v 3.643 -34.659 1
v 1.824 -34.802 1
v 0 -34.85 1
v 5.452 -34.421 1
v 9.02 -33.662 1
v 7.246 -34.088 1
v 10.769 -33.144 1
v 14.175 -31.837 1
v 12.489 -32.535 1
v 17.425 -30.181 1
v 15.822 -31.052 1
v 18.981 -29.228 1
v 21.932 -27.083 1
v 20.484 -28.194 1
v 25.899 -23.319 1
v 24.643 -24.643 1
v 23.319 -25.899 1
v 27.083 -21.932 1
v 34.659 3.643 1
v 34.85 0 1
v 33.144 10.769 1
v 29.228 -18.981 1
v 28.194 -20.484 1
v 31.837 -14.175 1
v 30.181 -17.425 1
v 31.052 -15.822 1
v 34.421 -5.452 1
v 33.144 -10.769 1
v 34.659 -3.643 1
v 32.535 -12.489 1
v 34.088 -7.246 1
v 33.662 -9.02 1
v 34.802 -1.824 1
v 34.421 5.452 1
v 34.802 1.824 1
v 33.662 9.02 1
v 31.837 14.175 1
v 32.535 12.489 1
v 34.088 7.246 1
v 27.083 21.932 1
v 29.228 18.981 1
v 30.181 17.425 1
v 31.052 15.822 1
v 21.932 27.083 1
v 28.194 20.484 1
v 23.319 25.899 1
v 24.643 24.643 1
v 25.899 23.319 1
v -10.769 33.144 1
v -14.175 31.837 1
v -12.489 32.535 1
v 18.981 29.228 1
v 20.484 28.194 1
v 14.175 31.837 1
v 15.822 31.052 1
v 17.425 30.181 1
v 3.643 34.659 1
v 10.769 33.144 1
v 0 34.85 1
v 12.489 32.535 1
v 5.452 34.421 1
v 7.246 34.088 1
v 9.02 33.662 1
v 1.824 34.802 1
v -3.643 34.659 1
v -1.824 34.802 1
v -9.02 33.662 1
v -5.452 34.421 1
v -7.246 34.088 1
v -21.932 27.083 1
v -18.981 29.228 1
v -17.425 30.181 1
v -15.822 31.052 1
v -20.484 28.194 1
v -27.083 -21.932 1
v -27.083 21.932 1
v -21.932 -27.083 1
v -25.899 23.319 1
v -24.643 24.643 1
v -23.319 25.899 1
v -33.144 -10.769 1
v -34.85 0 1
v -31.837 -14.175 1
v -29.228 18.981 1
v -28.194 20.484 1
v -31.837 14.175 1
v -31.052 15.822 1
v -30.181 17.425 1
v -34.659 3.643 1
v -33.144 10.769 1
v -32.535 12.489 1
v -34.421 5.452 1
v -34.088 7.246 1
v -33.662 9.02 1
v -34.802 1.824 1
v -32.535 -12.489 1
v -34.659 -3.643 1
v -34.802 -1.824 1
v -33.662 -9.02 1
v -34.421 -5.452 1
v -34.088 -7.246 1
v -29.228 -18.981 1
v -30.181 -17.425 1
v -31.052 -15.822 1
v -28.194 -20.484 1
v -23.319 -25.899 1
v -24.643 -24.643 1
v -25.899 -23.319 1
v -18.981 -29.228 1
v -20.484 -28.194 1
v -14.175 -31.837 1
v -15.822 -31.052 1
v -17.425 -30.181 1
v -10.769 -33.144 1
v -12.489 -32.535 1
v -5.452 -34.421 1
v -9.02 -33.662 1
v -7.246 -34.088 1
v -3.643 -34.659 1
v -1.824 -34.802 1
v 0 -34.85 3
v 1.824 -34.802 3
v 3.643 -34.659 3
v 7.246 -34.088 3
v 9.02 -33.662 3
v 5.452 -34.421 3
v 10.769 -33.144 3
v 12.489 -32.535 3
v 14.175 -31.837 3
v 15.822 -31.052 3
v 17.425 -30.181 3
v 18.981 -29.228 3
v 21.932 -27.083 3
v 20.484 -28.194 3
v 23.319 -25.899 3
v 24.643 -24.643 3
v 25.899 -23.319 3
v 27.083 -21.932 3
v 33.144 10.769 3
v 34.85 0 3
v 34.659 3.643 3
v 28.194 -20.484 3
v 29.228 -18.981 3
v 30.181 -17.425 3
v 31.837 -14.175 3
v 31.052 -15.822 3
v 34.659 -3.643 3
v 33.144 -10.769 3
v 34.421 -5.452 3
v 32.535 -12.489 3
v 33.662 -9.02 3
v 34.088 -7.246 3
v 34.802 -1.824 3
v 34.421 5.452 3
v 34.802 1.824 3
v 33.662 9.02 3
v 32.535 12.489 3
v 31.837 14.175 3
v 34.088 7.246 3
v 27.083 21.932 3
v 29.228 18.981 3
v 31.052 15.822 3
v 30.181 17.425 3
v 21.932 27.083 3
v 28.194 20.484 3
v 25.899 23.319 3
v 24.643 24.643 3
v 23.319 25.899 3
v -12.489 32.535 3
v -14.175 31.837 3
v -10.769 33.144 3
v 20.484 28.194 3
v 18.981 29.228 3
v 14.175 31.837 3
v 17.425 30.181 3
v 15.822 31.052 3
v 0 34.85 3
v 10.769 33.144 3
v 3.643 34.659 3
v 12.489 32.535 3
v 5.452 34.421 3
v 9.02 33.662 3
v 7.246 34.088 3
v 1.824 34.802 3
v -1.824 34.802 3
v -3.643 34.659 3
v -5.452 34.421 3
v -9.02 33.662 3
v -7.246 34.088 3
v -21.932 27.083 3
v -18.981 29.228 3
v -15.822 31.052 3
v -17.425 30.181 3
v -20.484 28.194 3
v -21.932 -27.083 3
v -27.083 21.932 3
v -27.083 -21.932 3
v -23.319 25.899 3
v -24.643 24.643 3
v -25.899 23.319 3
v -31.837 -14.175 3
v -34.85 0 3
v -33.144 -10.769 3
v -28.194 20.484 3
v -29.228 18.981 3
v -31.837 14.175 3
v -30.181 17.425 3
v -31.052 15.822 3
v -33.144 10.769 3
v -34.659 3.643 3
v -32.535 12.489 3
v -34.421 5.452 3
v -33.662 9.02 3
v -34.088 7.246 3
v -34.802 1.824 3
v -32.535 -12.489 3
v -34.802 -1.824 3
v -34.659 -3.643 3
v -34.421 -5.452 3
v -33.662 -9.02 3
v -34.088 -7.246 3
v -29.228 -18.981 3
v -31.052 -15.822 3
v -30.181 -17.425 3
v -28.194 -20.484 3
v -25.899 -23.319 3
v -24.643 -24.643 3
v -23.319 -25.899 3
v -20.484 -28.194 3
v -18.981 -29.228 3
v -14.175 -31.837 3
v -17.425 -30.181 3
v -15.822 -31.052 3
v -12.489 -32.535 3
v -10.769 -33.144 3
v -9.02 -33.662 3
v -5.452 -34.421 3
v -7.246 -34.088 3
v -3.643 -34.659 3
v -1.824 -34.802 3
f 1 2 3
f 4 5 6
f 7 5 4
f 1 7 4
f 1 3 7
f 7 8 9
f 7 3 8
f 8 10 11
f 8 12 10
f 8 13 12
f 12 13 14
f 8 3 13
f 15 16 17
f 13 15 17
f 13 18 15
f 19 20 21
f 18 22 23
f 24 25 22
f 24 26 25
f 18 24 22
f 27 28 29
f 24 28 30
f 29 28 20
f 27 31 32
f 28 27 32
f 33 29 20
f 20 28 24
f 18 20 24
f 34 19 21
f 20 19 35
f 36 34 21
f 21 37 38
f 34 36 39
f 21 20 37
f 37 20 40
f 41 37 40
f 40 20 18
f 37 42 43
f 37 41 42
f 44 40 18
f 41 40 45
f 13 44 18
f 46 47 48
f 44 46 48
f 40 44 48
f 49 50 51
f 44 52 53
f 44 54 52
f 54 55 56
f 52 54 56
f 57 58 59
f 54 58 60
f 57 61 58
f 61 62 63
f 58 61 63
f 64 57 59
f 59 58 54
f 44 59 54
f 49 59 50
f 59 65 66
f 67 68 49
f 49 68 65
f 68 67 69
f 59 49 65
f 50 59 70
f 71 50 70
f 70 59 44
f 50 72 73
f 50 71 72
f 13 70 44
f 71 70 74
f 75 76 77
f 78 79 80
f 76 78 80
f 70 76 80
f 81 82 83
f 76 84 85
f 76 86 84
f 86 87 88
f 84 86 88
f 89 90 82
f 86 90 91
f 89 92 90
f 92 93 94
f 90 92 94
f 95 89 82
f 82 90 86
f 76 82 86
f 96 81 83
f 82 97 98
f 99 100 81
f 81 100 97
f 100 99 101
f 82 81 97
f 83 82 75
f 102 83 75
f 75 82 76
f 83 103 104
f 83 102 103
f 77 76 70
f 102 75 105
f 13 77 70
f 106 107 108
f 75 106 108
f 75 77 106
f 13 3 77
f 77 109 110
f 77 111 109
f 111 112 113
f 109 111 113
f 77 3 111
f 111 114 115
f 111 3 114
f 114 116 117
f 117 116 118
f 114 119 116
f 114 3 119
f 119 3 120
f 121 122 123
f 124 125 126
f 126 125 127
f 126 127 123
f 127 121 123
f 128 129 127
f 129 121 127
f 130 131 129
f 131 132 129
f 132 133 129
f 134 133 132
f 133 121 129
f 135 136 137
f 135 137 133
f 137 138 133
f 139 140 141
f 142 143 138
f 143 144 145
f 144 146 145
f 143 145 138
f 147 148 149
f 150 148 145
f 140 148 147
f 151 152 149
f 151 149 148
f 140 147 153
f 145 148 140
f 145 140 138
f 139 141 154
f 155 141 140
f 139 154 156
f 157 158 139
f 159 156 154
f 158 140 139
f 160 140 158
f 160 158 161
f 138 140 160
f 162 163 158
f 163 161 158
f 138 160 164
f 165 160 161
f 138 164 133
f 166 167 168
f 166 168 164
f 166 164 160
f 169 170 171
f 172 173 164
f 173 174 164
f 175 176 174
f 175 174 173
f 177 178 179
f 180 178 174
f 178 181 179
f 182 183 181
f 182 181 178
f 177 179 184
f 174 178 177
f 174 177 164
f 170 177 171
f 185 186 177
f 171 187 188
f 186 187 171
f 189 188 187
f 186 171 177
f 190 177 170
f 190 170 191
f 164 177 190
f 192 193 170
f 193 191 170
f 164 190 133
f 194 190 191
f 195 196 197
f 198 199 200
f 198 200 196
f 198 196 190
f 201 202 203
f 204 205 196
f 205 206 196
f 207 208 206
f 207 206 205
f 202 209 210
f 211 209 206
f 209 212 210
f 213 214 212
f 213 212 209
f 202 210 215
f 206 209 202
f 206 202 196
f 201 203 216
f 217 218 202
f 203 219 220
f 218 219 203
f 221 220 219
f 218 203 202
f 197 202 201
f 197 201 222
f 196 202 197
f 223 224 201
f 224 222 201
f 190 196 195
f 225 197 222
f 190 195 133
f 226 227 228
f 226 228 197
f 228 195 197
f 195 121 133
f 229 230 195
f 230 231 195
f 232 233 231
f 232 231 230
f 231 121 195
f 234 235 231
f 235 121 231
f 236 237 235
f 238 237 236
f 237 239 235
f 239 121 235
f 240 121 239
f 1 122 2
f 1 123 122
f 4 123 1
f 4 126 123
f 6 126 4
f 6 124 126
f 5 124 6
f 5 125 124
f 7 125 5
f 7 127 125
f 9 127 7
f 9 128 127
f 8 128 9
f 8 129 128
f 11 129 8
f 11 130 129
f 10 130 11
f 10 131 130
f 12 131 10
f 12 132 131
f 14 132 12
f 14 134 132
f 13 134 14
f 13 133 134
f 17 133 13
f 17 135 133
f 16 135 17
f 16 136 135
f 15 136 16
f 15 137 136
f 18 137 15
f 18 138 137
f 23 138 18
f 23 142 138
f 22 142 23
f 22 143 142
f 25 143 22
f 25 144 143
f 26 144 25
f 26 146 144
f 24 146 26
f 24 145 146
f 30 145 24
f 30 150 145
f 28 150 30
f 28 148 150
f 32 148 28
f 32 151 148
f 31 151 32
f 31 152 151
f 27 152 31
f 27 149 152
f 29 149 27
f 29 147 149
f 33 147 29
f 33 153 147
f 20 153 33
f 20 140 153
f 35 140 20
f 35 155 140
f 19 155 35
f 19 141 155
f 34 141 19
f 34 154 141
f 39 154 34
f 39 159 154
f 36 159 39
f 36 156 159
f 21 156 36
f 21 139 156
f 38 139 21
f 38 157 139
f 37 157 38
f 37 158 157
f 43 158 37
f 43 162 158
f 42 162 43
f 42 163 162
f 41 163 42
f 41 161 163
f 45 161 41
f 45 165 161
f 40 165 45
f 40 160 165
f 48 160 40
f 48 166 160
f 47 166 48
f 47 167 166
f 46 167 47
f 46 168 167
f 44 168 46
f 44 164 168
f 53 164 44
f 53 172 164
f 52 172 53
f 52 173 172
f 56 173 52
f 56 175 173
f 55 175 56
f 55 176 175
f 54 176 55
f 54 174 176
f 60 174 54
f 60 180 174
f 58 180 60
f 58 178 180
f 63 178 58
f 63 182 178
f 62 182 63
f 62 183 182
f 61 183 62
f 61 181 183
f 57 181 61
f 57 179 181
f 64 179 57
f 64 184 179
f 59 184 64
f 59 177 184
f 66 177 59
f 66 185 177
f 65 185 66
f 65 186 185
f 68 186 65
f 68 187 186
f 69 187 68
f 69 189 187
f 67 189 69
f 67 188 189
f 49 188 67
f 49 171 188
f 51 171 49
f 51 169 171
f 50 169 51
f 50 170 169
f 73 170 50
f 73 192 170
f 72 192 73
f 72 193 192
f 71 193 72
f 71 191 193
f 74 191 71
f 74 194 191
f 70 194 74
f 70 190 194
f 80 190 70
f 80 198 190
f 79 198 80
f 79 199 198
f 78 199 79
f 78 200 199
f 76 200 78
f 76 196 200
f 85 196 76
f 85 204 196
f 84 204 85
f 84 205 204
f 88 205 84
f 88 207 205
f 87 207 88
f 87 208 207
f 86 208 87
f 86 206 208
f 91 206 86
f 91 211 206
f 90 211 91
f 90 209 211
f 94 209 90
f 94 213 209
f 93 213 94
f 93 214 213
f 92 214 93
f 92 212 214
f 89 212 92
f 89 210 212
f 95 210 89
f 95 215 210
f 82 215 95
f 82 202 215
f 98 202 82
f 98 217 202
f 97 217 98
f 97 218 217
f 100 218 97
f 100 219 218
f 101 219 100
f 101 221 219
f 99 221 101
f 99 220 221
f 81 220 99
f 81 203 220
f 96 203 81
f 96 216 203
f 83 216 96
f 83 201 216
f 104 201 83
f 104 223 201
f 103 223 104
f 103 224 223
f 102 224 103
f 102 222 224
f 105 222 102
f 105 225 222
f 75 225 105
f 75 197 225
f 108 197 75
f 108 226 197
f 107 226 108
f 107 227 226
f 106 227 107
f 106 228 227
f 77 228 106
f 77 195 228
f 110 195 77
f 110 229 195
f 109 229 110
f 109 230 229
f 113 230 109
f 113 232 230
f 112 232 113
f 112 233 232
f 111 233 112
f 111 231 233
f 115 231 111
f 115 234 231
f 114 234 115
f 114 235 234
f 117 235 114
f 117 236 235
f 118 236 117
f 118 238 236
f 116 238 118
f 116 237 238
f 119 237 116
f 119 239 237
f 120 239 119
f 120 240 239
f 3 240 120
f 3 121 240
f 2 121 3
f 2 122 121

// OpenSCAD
// ==== Shared Parameters ====
// Measure your pedestal's internal rebate (seat) carefully.
cavity_w   = 70;    // inner width (mm)
cavity_d   = 70;    // inner depth (mm)
lip_depth  = 2;     // rebate depth available for the diffuser to sit in (mm)
thickness  = 2.0;   // diffuser thickness (mm)
clearance  = 0.3;   // positive clearance for sit-on fit (mm)
chamfer    = 0.6;   // small edge break

/*
  Round diffuser — sit-on
*/
$fn=120;

diam = min(cavity_w, cavity_d) - clearance;

translate([0,0,thickness/2])
  linear_extrude(height=thickness)
    offset(delta=-chamfer) offset(delta=+chamfer)
      circle(r=diam/2);
